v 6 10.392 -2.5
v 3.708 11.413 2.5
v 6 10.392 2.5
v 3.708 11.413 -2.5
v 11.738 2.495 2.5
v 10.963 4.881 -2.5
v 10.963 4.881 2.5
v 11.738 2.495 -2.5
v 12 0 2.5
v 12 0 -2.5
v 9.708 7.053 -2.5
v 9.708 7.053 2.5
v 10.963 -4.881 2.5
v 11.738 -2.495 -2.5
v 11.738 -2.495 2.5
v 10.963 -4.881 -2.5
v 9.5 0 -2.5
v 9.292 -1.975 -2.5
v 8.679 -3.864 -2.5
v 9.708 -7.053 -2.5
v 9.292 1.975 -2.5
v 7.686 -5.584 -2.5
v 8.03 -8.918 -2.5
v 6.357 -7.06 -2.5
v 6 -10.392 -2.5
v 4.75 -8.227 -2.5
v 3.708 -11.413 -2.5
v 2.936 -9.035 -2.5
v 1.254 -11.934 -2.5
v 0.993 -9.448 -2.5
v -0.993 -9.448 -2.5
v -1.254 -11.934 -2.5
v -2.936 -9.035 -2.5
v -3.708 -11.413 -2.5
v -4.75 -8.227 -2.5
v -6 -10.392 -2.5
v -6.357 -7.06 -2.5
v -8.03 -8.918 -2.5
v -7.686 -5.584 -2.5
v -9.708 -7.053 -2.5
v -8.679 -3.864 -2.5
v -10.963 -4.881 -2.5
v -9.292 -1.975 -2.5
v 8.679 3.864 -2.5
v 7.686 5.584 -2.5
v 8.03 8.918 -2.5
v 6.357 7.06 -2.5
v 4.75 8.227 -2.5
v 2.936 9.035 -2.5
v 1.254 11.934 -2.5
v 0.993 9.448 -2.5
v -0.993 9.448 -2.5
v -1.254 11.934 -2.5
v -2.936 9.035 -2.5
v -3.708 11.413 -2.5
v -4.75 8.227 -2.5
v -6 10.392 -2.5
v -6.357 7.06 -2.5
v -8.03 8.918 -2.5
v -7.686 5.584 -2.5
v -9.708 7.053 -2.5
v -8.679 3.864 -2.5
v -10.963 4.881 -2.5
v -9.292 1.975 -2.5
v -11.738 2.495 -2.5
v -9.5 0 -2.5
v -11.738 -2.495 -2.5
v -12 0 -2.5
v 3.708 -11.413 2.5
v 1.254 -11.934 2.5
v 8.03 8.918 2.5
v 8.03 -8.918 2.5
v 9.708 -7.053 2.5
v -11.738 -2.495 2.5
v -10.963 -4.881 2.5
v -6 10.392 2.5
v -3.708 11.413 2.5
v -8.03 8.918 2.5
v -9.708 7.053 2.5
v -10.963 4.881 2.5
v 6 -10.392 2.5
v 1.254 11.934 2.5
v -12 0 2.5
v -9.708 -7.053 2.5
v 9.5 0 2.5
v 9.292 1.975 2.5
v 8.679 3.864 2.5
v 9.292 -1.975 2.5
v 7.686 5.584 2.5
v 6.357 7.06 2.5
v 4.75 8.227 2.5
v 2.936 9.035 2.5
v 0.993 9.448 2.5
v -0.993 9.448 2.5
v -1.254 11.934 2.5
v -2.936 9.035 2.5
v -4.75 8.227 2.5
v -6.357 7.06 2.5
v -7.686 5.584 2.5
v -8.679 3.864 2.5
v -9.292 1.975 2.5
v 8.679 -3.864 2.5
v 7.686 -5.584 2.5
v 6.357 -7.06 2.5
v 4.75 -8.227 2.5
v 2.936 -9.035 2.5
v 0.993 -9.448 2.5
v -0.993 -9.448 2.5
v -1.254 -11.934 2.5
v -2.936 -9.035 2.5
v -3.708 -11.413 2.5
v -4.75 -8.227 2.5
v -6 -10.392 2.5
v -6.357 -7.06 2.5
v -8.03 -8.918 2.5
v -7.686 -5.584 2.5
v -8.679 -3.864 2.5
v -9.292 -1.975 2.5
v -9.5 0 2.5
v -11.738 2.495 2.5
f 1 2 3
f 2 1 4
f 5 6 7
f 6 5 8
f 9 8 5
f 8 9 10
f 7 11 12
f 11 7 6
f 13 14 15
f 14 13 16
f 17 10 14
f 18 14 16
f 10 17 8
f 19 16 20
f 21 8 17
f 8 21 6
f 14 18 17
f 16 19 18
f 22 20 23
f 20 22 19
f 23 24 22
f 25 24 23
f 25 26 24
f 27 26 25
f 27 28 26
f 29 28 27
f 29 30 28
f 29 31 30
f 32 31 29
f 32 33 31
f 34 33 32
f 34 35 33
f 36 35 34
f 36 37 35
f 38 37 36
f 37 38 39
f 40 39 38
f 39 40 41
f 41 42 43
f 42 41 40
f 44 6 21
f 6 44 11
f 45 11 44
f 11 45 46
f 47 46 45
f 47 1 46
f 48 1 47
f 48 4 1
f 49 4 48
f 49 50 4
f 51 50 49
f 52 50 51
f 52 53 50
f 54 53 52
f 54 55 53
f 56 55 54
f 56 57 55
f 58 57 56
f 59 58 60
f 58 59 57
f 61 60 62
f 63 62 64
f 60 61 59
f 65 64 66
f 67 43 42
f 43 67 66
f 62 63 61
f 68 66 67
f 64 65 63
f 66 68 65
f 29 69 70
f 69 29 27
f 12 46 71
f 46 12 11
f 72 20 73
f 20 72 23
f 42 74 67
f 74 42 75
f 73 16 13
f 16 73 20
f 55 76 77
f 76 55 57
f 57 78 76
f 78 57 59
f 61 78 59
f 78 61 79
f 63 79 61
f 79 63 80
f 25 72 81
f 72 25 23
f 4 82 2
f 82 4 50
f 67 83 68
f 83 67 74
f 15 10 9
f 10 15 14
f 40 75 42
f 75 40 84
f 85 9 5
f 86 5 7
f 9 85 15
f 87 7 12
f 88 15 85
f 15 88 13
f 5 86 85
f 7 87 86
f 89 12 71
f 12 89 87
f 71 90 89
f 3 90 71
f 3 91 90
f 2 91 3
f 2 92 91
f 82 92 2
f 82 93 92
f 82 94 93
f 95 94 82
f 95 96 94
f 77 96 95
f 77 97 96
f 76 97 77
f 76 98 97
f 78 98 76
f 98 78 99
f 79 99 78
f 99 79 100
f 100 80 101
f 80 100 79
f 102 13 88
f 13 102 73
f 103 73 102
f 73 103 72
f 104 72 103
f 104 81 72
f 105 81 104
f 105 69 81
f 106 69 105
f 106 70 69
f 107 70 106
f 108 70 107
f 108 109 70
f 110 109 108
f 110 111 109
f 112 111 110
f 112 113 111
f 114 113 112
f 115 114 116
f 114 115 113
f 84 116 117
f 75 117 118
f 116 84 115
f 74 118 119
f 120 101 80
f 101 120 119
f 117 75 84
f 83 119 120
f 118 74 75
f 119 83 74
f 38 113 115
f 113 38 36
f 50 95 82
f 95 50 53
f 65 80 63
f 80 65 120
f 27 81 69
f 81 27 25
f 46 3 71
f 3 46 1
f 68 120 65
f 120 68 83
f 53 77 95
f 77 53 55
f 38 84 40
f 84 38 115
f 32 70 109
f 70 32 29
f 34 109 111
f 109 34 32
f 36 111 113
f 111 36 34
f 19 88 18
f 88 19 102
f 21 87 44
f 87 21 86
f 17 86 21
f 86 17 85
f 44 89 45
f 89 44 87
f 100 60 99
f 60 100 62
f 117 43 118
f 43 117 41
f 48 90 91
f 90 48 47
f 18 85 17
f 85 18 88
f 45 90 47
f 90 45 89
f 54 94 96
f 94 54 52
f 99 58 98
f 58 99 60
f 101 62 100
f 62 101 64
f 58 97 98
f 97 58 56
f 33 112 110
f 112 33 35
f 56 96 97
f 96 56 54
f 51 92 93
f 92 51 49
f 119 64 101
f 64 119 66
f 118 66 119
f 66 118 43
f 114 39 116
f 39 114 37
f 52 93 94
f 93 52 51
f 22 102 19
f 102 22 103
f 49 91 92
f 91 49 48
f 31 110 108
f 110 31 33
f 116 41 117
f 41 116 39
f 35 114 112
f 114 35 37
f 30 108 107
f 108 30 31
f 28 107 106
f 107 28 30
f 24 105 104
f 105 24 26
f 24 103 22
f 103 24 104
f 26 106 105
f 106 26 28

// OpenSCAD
module spoked_wheel(radius=12, width=5, thickness=5, number_of_spokes=7, spoke_radius=1.5) {
    // Ring
    inner_radius = radius - thickness/2;
    difference() {
    cylinder(h=width, r=radius, center=true);
    cylinder(h=width + 1, r=inner_radius, center=true);
    }
    }

spoked_wheel();
